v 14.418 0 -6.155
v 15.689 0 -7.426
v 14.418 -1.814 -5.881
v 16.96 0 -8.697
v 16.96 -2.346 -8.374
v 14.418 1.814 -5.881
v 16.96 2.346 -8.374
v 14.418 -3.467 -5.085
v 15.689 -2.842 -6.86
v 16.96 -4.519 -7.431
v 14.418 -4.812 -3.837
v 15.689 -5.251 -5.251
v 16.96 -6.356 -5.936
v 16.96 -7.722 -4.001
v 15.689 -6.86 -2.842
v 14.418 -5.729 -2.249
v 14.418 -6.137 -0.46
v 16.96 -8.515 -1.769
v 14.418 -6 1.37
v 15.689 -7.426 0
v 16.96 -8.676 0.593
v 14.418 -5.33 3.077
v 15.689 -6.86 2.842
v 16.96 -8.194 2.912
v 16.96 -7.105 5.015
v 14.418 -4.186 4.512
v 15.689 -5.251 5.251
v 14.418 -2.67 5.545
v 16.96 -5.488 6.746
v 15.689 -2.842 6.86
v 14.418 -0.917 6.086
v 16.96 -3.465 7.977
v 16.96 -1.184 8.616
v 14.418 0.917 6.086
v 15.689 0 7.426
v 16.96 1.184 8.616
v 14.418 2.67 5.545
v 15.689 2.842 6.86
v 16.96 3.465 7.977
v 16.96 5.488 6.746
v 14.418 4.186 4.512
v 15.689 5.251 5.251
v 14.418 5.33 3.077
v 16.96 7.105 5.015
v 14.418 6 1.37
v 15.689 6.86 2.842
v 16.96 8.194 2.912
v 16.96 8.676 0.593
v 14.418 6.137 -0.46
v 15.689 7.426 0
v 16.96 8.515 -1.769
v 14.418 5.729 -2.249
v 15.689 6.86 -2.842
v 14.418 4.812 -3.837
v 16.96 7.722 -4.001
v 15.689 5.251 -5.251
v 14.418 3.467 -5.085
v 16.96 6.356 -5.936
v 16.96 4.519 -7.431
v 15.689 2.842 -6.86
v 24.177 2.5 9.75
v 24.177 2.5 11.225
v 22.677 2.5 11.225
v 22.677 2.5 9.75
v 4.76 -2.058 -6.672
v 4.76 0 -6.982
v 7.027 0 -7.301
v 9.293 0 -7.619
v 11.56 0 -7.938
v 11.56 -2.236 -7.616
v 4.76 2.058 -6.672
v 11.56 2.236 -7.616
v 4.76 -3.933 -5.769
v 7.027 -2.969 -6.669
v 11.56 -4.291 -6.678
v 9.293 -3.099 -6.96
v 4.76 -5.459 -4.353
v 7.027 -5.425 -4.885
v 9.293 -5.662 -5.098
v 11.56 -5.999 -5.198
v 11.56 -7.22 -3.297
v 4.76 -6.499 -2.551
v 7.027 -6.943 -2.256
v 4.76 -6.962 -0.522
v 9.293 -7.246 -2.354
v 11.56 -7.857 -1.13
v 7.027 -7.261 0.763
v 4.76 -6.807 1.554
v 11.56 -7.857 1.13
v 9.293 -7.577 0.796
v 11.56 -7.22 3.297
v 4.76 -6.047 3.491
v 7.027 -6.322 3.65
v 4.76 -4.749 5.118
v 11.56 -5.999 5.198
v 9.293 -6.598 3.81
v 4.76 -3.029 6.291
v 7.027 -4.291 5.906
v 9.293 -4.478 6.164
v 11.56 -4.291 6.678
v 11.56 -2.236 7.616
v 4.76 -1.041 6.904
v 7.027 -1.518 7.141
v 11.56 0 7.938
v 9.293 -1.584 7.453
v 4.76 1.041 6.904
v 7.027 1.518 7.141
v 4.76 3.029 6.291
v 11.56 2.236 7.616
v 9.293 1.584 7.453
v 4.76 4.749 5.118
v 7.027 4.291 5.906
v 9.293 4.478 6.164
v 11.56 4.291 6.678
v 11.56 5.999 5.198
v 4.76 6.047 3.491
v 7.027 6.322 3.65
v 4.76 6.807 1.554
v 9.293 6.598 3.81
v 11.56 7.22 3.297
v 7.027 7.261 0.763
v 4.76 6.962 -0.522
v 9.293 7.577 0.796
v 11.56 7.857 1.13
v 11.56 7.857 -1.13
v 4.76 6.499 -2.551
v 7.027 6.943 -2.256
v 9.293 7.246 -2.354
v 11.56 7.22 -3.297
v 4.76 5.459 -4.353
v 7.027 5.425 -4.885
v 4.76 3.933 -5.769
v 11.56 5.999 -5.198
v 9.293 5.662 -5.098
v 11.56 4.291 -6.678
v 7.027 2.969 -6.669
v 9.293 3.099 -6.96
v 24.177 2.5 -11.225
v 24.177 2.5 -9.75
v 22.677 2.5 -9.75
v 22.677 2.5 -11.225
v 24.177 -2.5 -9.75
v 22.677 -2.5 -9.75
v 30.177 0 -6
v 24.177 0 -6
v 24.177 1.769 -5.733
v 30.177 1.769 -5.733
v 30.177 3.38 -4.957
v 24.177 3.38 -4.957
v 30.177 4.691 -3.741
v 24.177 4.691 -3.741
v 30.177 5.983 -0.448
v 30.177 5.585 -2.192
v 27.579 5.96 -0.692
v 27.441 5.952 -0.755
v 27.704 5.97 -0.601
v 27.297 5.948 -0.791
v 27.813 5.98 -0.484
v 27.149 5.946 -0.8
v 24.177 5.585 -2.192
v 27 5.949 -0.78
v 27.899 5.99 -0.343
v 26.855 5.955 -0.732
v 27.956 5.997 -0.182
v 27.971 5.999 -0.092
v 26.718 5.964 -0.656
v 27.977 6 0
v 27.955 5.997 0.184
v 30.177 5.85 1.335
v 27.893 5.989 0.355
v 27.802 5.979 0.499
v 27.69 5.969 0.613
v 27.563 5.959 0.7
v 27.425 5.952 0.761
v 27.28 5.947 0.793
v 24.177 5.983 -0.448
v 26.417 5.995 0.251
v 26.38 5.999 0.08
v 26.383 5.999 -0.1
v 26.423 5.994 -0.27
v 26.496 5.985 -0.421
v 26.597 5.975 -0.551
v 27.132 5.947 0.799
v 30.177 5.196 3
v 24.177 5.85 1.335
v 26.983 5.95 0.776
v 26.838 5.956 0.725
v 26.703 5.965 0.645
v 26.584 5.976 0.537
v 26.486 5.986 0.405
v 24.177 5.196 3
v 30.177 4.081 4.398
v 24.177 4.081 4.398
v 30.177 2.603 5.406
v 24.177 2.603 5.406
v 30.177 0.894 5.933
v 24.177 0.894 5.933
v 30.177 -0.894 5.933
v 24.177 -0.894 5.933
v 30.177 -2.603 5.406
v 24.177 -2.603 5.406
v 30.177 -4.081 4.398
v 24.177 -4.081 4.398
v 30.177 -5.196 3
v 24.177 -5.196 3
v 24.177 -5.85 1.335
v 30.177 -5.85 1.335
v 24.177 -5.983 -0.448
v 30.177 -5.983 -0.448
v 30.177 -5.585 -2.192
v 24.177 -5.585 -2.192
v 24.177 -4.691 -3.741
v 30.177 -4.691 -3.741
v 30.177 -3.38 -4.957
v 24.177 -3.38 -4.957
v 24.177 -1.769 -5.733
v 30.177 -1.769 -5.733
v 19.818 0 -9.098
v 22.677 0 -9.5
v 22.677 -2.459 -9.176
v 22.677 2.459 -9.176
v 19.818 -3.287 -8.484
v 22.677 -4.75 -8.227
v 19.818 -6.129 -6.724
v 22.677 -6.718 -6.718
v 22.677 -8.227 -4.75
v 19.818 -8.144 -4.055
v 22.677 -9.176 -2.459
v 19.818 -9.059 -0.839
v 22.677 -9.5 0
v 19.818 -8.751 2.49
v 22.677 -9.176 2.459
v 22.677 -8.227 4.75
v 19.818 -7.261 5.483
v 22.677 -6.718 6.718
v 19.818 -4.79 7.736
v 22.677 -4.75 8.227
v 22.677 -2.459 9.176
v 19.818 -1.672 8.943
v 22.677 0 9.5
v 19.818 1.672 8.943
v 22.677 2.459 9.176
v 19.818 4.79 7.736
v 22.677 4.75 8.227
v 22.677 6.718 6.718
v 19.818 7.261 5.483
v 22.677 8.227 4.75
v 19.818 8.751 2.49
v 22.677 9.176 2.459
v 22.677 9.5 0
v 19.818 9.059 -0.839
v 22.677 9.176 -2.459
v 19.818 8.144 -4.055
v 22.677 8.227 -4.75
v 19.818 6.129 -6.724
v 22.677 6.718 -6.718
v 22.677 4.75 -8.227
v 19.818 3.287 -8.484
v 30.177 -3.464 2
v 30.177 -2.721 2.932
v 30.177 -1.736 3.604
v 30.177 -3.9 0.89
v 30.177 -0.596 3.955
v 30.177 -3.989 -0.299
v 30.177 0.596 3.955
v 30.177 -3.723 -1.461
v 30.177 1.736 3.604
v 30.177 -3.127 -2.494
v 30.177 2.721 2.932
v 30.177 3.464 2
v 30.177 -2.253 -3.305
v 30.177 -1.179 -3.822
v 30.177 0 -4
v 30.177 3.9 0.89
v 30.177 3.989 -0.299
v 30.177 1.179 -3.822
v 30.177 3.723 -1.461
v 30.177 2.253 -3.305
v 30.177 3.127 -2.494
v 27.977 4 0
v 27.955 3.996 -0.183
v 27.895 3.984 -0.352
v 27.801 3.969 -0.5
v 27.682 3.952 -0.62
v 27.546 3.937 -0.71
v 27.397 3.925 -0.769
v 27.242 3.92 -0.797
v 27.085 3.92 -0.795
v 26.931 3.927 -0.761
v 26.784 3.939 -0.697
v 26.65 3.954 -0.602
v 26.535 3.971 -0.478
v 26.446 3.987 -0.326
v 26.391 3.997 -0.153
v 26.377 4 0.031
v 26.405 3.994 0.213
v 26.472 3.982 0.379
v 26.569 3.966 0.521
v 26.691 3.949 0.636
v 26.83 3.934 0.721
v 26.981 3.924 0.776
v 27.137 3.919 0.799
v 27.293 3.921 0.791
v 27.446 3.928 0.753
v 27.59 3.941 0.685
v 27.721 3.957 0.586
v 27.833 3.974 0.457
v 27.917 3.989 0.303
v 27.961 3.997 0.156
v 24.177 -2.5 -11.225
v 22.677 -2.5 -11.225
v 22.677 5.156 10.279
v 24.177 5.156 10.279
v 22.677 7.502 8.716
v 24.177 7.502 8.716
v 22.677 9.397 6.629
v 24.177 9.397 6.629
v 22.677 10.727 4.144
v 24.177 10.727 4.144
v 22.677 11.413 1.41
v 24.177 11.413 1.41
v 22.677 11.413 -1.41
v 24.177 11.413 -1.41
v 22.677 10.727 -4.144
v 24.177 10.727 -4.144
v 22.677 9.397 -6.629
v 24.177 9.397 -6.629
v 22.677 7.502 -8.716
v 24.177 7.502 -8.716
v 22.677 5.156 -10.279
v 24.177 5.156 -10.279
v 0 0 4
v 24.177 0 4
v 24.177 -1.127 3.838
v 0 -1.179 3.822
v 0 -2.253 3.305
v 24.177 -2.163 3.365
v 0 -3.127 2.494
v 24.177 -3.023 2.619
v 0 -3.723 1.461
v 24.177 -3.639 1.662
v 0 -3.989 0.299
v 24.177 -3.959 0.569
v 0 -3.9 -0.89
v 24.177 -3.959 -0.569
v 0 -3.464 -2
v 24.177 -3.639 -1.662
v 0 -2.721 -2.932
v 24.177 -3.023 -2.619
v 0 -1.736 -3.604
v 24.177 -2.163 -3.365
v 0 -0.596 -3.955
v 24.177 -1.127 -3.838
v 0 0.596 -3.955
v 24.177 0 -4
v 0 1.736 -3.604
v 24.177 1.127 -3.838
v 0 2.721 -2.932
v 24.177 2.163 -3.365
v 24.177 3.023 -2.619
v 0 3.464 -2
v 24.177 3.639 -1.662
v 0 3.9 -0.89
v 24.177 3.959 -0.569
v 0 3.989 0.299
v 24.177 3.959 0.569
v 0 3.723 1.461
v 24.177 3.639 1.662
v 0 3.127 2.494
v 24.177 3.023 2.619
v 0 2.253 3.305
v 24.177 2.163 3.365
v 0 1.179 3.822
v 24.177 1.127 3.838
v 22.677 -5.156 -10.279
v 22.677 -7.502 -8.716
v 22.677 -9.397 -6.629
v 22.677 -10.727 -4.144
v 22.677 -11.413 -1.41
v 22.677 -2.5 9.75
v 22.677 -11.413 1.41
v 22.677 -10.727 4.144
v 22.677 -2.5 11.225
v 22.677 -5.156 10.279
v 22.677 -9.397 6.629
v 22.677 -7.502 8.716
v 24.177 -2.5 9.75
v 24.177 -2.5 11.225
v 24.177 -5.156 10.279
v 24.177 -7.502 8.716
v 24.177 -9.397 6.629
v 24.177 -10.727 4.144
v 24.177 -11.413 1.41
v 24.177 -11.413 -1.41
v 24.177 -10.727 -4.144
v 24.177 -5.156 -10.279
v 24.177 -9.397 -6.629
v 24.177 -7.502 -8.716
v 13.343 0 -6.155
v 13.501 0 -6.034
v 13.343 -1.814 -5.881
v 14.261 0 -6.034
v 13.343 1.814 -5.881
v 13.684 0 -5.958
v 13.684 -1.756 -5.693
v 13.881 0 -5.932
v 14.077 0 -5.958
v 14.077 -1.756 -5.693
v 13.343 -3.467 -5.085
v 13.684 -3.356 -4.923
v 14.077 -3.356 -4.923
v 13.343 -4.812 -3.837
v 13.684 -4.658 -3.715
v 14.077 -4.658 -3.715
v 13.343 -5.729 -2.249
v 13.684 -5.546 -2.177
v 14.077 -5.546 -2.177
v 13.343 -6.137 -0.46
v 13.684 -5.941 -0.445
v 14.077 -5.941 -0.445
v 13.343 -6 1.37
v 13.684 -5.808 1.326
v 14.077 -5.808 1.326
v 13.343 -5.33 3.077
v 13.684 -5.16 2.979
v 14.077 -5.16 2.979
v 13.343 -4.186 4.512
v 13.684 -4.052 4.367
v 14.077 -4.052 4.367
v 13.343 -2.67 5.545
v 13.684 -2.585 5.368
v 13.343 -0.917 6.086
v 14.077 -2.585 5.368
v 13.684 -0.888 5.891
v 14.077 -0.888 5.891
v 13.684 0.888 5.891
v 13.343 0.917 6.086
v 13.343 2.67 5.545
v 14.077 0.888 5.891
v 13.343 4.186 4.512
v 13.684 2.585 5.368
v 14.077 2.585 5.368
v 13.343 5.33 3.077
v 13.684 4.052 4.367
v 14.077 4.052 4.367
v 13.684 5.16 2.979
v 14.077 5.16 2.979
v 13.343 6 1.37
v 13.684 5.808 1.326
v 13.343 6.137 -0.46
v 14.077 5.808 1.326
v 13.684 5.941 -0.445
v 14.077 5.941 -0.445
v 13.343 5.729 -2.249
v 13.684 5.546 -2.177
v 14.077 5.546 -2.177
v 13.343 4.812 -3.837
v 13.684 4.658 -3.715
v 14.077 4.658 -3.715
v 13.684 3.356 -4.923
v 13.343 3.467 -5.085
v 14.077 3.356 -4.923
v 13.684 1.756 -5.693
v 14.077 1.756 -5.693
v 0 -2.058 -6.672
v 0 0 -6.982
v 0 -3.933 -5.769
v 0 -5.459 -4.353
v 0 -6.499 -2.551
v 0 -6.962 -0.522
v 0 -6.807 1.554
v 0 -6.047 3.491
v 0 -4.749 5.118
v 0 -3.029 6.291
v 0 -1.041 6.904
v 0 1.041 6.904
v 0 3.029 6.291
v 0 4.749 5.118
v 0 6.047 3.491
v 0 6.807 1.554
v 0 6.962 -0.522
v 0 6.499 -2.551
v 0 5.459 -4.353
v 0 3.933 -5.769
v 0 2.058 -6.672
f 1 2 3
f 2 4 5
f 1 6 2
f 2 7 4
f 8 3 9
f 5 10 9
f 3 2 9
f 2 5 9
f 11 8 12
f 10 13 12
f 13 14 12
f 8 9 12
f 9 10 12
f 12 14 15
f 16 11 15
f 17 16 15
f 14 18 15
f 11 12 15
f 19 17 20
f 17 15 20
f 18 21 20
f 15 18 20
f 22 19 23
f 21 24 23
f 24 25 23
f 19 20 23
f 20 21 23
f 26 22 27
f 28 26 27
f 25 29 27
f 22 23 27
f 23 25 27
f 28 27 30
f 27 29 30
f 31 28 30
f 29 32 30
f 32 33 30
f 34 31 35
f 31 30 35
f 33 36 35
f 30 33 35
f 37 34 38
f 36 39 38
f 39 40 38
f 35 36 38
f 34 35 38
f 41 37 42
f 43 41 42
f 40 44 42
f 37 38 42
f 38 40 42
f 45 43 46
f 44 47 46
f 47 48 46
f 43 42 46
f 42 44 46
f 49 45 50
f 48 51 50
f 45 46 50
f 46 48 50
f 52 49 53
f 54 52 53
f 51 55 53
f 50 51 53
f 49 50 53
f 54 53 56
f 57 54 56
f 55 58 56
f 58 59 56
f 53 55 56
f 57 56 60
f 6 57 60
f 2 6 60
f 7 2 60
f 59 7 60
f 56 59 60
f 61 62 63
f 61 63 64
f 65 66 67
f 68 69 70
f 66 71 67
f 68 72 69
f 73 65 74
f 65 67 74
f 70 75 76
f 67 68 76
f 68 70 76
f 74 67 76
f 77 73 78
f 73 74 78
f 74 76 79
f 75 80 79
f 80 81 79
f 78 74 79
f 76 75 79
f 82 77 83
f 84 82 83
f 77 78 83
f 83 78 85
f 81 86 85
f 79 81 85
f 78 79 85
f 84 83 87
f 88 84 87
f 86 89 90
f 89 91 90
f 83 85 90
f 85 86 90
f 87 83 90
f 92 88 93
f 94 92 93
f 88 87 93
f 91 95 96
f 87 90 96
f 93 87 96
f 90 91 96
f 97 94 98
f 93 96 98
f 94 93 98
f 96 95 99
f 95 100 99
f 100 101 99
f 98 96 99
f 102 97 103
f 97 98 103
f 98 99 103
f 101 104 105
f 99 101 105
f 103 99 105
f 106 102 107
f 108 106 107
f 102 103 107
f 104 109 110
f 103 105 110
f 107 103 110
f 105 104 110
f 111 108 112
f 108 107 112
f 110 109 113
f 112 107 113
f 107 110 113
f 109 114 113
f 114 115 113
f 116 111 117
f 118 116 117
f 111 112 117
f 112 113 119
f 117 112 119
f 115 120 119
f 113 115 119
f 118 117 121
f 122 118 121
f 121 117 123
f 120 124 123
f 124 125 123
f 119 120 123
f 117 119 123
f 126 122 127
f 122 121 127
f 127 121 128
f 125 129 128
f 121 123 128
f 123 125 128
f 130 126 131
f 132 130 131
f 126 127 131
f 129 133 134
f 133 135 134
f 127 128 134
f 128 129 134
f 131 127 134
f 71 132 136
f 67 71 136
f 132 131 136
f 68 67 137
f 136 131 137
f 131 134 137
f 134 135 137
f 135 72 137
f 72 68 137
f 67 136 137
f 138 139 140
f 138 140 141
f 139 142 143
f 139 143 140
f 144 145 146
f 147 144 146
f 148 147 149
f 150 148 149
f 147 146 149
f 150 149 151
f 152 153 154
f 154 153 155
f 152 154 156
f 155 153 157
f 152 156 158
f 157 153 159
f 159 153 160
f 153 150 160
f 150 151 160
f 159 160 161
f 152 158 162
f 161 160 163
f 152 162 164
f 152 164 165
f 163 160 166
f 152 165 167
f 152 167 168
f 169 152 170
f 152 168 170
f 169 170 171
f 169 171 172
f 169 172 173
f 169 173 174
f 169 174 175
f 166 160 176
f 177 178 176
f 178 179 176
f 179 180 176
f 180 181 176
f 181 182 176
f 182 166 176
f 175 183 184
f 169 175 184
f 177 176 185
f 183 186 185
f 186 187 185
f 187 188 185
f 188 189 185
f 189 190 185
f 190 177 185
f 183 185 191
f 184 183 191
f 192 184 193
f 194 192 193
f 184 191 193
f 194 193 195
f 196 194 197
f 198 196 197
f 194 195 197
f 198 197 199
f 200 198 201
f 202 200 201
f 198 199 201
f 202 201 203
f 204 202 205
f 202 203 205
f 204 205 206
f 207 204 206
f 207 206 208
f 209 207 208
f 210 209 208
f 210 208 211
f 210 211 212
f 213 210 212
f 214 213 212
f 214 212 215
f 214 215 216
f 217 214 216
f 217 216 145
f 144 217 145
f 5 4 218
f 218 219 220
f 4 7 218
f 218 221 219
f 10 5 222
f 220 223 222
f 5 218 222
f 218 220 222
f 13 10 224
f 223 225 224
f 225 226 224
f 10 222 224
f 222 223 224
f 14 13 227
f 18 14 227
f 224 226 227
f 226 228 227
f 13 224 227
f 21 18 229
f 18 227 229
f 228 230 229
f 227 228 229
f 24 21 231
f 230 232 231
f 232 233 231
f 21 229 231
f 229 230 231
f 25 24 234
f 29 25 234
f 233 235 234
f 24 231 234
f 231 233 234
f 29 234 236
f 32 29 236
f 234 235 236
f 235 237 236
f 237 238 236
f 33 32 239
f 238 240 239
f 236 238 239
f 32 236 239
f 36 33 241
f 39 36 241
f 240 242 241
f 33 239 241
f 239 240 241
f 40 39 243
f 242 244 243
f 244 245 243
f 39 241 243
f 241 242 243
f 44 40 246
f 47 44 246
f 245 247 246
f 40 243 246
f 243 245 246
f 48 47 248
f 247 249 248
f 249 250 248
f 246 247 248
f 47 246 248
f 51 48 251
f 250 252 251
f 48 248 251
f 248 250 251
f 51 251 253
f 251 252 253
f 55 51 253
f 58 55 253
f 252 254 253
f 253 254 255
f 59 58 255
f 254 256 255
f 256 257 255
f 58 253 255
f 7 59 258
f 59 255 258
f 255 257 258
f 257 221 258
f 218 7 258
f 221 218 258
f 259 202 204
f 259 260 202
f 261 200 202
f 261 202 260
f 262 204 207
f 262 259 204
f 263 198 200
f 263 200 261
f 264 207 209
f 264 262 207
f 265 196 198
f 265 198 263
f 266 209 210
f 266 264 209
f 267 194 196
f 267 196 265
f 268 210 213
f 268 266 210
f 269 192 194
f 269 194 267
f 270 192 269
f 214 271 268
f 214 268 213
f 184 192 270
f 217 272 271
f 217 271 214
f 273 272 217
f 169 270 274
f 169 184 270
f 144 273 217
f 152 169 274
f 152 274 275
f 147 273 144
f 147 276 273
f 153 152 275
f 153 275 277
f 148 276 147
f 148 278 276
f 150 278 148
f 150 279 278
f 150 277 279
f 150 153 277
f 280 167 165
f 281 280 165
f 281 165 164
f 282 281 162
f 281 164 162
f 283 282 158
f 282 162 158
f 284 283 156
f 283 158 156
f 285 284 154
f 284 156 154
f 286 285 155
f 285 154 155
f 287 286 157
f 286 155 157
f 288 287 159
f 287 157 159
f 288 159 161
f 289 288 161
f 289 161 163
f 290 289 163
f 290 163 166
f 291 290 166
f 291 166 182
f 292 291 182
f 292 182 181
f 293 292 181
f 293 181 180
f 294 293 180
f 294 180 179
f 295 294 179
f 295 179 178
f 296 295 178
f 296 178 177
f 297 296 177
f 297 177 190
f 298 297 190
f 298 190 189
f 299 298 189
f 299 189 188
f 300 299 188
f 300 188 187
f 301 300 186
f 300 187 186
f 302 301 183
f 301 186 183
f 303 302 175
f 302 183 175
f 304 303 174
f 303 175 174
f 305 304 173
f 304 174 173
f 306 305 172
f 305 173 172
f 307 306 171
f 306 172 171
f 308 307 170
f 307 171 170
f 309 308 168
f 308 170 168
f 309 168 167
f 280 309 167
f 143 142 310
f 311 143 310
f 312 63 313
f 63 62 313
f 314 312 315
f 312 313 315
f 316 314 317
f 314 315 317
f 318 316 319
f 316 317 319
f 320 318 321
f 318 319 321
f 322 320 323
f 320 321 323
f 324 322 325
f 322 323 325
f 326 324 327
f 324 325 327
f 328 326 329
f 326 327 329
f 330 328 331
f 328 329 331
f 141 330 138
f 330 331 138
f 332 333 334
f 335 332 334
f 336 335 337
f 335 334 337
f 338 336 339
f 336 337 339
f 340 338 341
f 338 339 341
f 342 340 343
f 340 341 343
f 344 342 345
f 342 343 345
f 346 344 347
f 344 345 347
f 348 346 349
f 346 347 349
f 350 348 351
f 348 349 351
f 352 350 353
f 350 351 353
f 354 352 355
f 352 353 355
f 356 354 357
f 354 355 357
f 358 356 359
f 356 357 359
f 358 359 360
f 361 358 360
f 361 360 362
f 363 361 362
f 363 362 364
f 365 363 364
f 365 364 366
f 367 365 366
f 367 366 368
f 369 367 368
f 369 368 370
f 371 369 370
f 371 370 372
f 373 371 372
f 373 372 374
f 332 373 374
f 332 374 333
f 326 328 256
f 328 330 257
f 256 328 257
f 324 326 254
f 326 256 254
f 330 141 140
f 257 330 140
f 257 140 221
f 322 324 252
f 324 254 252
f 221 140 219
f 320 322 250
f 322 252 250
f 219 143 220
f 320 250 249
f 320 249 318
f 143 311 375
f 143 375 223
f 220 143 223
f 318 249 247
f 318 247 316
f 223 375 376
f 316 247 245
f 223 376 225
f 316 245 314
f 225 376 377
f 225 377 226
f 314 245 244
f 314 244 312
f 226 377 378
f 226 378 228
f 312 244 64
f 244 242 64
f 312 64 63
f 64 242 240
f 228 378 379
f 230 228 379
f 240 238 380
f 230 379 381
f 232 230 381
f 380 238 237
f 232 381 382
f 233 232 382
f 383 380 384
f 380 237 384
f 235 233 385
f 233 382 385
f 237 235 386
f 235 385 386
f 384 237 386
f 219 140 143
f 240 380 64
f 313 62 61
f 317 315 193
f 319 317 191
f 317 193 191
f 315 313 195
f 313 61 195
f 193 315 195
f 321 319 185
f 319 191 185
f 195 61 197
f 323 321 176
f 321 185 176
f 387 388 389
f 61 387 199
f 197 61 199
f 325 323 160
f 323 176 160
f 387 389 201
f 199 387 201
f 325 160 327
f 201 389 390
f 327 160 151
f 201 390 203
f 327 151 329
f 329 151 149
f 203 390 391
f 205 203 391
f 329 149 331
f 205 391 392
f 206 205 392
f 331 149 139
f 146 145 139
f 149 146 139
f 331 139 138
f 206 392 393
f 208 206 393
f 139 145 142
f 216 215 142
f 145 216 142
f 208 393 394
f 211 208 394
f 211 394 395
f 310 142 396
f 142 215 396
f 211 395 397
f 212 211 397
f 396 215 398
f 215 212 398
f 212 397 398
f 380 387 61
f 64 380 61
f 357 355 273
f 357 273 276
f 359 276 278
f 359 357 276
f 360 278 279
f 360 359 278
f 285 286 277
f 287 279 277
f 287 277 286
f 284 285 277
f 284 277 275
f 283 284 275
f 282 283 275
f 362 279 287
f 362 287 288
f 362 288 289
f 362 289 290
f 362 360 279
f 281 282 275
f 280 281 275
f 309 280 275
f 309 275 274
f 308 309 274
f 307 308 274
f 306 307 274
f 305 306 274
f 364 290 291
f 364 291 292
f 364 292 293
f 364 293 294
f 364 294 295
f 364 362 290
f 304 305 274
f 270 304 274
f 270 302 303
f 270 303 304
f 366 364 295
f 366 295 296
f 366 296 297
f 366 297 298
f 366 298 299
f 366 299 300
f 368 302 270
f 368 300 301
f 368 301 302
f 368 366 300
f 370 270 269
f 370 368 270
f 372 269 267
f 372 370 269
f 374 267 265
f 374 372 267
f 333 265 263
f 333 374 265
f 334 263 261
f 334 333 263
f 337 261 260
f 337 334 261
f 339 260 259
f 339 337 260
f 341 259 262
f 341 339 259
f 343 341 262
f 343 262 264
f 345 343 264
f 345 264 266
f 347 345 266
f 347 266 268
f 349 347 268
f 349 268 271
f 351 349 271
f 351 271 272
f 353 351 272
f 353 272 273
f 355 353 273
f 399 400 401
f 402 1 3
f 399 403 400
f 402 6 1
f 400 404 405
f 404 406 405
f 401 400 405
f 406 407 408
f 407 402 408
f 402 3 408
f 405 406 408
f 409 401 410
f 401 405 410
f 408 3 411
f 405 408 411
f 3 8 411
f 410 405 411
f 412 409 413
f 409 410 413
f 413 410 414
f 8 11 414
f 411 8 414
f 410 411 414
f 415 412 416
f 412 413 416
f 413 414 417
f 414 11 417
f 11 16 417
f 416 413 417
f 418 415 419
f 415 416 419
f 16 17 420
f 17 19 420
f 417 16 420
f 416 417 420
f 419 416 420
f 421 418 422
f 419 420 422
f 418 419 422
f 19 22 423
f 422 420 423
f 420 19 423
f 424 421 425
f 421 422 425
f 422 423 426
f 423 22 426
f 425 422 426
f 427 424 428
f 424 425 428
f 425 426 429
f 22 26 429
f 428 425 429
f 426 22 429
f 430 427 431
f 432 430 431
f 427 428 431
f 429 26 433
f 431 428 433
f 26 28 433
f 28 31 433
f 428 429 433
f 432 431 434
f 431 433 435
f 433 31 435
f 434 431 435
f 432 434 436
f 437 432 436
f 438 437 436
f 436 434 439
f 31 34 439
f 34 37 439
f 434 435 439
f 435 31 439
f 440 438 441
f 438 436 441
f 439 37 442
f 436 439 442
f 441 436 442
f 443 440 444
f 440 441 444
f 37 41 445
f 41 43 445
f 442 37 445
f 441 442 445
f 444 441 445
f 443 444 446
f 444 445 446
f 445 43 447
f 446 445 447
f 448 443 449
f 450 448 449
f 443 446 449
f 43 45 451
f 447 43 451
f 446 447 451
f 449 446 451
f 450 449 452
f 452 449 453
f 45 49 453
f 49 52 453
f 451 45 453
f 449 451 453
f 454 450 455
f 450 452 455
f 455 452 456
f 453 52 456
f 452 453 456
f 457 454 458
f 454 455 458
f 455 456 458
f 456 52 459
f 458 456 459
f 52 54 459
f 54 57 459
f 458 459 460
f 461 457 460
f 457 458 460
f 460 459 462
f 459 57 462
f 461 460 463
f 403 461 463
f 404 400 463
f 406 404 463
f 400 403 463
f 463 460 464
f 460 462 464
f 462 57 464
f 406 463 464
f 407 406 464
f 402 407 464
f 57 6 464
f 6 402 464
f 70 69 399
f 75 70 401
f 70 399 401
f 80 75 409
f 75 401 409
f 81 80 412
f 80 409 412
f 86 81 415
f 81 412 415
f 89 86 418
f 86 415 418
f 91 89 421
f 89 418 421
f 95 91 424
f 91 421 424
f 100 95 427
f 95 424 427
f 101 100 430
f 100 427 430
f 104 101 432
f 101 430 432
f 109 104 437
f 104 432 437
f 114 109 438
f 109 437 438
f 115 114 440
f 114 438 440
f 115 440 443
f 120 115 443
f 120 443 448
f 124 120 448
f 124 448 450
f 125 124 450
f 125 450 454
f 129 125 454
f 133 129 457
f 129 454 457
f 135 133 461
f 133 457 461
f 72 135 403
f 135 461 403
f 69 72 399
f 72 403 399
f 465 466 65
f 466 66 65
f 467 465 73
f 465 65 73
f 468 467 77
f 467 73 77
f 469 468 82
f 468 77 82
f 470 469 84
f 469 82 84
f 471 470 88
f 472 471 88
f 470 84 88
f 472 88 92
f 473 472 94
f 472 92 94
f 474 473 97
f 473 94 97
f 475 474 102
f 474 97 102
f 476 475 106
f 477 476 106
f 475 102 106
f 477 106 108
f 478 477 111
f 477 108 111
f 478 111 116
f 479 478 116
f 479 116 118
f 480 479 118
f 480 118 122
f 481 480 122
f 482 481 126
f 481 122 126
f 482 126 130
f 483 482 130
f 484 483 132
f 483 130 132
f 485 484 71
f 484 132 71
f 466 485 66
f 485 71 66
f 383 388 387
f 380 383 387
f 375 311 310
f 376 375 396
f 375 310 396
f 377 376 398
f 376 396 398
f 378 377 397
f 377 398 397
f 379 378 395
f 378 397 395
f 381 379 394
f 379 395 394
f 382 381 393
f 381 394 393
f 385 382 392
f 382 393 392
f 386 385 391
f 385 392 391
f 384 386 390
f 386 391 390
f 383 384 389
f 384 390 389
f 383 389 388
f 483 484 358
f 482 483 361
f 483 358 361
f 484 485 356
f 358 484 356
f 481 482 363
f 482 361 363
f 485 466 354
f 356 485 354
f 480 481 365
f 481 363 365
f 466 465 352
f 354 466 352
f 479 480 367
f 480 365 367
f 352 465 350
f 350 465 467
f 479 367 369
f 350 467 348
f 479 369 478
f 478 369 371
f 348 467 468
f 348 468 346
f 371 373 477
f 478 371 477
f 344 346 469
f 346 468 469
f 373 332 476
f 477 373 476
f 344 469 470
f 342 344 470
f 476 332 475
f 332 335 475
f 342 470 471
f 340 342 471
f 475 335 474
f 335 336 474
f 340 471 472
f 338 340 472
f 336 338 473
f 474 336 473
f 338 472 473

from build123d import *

# Parameters (mm, degrees)
SKETCH3_W                  = 2
SKETCH3_H                  = 5
CUT_EXTRUDE6_DEPTH         = 30.137659458
SKETCH2_R                  = 2.5
CUT_EXTRUDE7_DEPTH         = 30.030211827
SKETCH4_R                  = 6
SKETCH4_R_2                = 4
BOSS_EXTRUDE1_DEPTH        = 6
SKETCH5_R                  = 4
CUT_EXTRUDE8_DEPTH         = 25
M2X0_4_TAPPED_HOLE1_REACH  = 38.645
M2X0_4_TAPPED_HOLE1_BORE_R = 0.8


with BuildPart() as part:
    # Sketch1 → Revolve3 (revolve)
    with BuildSketch(Plane.XY, mode=Mode.PRIVATE) as revolve3_sk:
        with BuildLine():
            Line((0, 0), (0, 6.982))
            Line((0, 6.982), (4.76, 6.982))
            Line((4.76, 6.982), (11.56, 7.937677676))
            Line((11.56, 7.937677676), (13.343138593, 6.154539083))
            ThreePointArc((13.343138593, 6.154539083), (13.880539746, 5.931940237), (14.4179409, 6.154539083))
            Line((14.4179409, 6.154539083), (16.96, 8.696598183))
            Line((16.96, 8.696598183), (22.676500961, 9.5))
            Line((22.676500961, 9.5), (22.676500961, 11.5))
            Line((22.676500961, 11.5), (24.176500961, 11.5))
            Line((24.176500961, 11.5), (24.176500961, 0))
            Line((24.176500961, 0), (0, 0))
        make_face()
    revolve(revolve3_sk.sketch.rotate(Axis((24.176500961, 0, 0), (-1, 0, 0)), 90), axis=Axis((24.176500961, 0, 0), (-1, 0, 0)))

    # Sketch3 → Cut-Extrude6 (cut, through all)
    with BuildSketch(Plane(origin=(24.176500961, 0, 0), x_dir=(0, 0, -1), z_dir=(1, 0, 0))):
        with Locations((-10.75, 0)):
            Rectangle(SKETCH3_W, SKETCH3_H)
        with Locations((10.75, 0)):
            Rectangle(SKETCH3_W, SKETCH3_H)
    extrude(amount=-CUT_EXTRUDE6_DEPTH, mode=Mode.SUBTRACT)

    # Sketch2 → Cut-Extrude7 (cut, through all)
    with BuildSketch(Plane(origin=(0, 0, 0), x_dir=(0, 0, -1), z_dir=(1, 0, 0))):
        Circle(SKETCH2_R)
    extrude(amount=CUT_EXTRUDE7_DEPTH, mode=Mode.SUBTRACT)

    # Sketch4 → Boss-Extrude1 (add)
    with BuildSketch(Plane(origin=(24.176500961, 0, 0), x_dir=(0, 0, -1), z_dir=(1, 0, 0))):
        Circle(SKETCH4_R)
        Circle(SKETCH4_R_2, mode=Mode.SUBTRACT)
    extrude(amount=BOSS_EXTRUDE1_DEPTH)

    # Sketch5 → Cut-Extrude8 (cut)
    with BuildSketch(Plane(origin=(24.176500961, 0, 0), x_dir=(0, 0, -1), z_dir=(1, 0, 0))):
        with Locations(Location((0, 0, 0), (0, 0, 180))):
            Circle(SKETCH5_R)
    extrude(amount=-CUT_EXTRUDE8_DEPTH, mode=Mode.SUBTRACT)

    # M2x0.4 Tapped Hole1 bore → M2x0.4 Tapped Hole1 (cut, up to next)
    with BuildSketch(Plane(origin=(0, 6, 0), x_dir=(1, 0, 0), z_dir=(0, 1, 0)), mode=Mode.PRIVATE) as m2x0_4_tapped_hole1_sk1:
        with Locations((27.176500961, 0)):
            Circle(M2X0_4_TAPPED_HOLE1_BORE_R)
    m2x0_4_tapped_hole1_tool1 = extrude(m2x0_4_tapped_hole1_sk1.sketch, amount=-M2X0_4_TAPPED_HOLE1_REACH, mode=Mode.PRIVATE) & part.part
    add(m2x0_4_tapped_hole1_tool1.solids().sort_by_distance((27.176501, 6, 0))[0], mode=Mode.SUBTRACT)


solid = part.part
